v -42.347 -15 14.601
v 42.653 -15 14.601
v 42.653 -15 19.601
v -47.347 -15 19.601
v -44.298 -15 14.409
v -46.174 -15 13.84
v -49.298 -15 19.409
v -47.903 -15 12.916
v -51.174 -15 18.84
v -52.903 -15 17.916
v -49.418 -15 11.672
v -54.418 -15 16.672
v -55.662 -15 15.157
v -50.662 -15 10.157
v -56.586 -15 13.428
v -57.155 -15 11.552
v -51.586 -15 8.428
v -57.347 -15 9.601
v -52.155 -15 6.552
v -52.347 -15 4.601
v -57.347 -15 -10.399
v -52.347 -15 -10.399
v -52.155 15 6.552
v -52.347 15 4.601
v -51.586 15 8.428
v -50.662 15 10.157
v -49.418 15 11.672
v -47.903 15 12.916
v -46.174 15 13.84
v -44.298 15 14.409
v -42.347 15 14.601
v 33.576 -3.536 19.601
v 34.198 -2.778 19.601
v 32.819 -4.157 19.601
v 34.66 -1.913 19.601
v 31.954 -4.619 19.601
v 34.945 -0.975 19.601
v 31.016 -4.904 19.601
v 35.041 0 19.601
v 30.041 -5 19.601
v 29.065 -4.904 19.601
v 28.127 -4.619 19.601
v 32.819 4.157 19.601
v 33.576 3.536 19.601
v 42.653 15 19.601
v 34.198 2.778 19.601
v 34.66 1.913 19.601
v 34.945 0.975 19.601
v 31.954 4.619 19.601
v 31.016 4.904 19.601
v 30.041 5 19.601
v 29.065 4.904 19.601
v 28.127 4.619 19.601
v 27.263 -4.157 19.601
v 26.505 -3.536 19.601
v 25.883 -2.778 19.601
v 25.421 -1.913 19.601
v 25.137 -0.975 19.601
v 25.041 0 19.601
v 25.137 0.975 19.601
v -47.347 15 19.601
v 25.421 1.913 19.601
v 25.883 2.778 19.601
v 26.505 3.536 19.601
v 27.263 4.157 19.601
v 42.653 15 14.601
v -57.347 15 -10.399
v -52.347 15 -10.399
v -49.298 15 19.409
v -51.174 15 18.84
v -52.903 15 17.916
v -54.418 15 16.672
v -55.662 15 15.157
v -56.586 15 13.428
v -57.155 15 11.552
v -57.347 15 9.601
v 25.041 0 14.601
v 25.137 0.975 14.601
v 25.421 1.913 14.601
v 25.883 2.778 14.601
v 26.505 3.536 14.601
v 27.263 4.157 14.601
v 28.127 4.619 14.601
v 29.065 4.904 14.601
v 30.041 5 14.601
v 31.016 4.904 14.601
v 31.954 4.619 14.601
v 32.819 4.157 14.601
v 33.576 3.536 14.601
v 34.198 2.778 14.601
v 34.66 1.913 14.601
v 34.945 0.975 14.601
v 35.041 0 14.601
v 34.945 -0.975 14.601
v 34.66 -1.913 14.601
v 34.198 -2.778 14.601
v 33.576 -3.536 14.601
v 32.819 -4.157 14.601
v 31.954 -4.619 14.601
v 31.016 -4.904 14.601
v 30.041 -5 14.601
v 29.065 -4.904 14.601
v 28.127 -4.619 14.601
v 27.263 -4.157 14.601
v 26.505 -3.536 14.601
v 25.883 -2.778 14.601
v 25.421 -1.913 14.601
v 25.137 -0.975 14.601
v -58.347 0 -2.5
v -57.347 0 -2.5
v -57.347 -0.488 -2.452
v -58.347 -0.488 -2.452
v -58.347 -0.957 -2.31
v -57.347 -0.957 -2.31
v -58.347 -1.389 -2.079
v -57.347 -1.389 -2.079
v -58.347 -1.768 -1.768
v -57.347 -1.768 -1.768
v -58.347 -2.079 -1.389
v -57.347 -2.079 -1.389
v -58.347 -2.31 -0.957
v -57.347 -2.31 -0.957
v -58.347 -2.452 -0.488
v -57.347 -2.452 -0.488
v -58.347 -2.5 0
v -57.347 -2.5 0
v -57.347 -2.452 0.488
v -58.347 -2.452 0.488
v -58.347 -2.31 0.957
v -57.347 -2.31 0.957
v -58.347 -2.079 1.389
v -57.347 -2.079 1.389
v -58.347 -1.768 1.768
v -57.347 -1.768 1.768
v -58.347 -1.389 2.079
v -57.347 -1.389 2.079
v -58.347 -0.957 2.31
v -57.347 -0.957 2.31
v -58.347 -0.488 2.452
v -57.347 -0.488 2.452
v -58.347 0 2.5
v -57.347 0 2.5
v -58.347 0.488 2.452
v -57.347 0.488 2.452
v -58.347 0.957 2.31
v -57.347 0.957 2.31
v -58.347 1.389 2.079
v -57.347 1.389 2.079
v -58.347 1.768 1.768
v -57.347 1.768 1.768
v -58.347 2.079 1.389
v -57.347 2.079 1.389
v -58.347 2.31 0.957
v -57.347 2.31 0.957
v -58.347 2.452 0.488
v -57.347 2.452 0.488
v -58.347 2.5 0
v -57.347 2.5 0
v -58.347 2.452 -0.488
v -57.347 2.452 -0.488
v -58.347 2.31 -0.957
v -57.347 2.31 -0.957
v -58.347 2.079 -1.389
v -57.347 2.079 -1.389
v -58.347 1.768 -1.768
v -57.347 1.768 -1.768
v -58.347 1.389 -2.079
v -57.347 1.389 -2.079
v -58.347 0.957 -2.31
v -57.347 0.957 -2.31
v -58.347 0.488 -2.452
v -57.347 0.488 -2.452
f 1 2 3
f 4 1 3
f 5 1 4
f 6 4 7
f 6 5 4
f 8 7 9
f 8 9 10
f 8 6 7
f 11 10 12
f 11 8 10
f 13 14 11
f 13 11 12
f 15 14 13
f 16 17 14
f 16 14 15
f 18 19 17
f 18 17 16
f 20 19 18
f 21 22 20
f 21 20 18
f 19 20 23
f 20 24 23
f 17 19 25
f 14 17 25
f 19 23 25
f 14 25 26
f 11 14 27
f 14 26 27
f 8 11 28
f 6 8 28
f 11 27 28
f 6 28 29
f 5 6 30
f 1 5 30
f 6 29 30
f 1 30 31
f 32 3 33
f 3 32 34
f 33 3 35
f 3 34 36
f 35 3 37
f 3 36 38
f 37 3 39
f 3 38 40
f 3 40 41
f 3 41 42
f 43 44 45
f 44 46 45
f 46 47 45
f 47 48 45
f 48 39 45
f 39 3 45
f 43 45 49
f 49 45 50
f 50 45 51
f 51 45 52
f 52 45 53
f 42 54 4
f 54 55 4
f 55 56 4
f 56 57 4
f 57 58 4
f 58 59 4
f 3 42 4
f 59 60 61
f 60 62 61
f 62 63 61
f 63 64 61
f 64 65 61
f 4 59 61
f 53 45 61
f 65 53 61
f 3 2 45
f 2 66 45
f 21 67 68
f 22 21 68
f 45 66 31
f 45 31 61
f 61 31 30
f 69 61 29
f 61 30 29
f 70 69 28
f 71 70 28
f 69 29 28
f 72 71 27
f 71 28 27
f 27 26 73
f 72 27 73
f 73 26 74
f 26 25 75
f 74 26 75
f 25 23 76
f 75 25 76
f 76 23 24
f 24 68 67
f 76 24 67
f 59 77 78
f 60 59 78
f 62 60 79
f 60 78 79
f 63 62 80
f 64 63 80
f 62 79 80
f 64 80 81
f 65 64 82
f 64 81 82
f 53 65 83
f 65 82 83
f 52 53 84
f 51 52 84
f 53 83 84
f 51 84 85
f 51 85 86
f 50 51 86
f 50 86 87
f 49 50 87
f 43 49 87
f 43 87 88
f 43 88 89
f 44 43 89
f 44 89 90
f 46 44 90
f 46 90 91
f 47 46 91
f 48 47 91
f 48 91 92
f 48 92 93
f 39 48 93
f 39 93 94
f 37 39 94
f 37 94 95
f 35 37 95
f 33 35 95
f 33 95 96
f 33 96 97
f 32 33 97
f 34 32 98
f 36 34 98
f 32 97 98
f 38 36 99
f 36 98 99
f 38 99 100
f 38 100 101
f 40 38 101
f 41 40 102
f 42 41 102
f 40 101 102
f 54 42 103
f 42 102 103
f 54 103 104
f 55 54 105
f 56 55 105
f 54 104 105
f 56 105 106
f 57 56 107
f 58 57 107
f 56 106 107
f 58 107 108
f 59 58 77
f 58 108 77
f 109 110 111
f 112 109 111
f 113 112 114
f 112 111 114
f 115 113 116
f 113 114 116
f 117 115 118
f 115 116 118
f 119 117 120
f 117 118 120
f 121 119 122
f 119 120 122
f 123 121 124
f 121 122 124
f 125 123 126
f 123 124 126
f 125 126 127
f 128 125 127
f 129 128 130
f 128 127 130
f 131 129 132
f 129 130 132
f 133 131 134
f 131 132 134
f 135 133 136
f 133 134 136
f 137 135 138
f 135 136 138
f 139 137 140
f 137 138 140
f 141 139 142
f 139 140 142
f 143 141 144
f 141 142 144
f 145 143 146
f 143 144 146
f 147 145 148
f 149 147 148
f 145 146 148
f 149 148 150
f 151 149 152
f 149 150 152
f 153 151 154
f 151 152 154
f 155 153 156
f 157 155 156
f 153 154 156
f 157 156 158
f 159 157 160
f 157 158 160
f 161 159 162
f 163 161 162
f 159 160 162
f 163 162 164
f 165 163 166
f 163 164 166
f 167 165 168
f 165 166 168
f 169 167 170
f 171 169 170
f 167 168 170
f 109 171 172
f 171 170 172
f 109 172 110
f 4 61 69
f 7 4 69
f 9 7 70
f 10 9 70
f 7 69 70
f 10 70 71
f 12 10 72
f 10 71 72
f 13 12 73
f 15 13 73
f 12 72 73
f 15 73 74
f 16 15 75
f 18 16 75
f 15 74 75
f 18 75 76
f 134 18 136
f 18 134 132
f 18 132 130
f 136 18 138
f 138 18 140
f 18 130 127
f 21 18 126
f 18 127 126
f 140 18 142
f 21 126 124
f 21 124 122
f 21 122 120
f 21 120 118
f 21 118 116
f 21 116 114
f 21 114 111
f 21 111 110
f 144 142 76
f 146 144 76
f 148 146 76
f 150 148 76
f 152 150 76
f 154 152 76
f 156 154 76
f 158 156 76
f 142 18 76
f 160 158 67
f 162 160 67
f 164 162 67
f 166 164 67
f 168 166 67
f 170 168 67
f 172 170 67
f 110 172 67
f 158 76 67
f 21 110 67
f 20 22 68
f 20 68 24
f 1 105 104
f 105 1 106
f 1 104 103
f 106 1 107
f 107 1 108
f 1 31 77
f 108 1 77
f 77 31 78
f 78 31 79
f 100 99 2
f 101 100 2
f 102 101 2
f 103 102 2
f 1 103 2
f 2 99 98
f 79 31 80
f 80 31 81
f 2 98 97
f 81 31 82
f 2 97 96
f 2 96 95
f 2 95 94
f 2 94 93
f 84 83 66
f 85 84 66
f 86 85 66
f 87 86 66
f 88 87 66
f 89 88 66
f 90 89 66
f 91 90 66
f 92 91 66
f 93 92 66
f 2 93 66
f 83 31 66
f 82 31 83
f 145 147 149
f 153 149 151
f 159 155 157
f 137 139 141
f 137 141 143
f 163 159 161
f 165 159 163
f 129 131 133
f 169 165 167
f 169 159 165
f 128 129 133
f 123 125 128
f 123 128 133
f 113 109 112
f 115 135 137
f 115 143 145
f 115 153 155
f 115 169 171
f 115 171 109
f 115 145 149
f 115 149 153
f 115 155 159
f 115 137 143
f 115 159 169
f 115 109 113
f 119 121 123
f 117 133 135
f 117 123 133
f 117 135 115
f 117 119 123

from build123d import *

# Parameters (mm, degrees)
BOSS_EXTRUDE1_DEPTH = 15
SKETCH2_R           = 5
CUT_EXTRUDE1_DEPTH  = 30
SKETCH3_R           = 2.5
BOSS_EXTRUDE2_DEPTH = 1


with BuildPart() as part:
    # Sketch1 → Boss-Extrude1 (new, symmetric)
    with BuildSketch(Plane(origin=(0, 0, 0), x_dir=(1, 0, 0), z_dir=(0, 1, 0))):
        with BuildLine():
            Line((-57.34741784, 10.399061033), (-52.34741784, 10.399061033))
            Line((-52.34741784, 10.399061033), (-52.34741784, -4.600938967))
            ThreePointArc((-52.34741784, -4.600938967), (-49.418485652, -11.672006779), (-42.34741784, -14.600938967))
            Line((-42.34741784, -14.600938967), (42.65258216, -14.600938967))
            Line((42.65258216, -14.600938967), (42.65258216, -19.600938967))
            Line((42.65258216, -19.600938967), (-47.34741784, -19.600938967))
            ThreePointArc((-47.34741784, -19.600938967), (-54.418485652, -16.672006779), (-57.34741784, -9.600938967))
            Line((-57.34741784, -9.600938967), (-57.34741784, 10.399061033))
        make_face()
    extrude(amount=BOSS_EXTRUDE1_DEPTH, both=True)

    # Sketch2 → Cut-Extrude1 (cut)
    with BuildSketch(Plane(origin=(0, 0, 14.600938967), x_dir=(-1, 0, 0), z_dir=(0, 0, -1))):
        with Locations((-30.040799479, 0)):
            Circle(SKETCH2_R)
    extrude(amount=-CUT_EXTRUDE1_DEPTH, mode=Mode.SUBTRACT)

    # Sketch3 → Boss-Extrude2 (add)
    with BuildSketch(Plane.ZY.offset(57.34741784)):
        with Locations(Location((0, 0, 0), (0, 0, 180))):
            Circle(SKETCH3_R)
    extrude(amount=BOSS_EXTRUDE2_DEPTH)


solid = part.part
